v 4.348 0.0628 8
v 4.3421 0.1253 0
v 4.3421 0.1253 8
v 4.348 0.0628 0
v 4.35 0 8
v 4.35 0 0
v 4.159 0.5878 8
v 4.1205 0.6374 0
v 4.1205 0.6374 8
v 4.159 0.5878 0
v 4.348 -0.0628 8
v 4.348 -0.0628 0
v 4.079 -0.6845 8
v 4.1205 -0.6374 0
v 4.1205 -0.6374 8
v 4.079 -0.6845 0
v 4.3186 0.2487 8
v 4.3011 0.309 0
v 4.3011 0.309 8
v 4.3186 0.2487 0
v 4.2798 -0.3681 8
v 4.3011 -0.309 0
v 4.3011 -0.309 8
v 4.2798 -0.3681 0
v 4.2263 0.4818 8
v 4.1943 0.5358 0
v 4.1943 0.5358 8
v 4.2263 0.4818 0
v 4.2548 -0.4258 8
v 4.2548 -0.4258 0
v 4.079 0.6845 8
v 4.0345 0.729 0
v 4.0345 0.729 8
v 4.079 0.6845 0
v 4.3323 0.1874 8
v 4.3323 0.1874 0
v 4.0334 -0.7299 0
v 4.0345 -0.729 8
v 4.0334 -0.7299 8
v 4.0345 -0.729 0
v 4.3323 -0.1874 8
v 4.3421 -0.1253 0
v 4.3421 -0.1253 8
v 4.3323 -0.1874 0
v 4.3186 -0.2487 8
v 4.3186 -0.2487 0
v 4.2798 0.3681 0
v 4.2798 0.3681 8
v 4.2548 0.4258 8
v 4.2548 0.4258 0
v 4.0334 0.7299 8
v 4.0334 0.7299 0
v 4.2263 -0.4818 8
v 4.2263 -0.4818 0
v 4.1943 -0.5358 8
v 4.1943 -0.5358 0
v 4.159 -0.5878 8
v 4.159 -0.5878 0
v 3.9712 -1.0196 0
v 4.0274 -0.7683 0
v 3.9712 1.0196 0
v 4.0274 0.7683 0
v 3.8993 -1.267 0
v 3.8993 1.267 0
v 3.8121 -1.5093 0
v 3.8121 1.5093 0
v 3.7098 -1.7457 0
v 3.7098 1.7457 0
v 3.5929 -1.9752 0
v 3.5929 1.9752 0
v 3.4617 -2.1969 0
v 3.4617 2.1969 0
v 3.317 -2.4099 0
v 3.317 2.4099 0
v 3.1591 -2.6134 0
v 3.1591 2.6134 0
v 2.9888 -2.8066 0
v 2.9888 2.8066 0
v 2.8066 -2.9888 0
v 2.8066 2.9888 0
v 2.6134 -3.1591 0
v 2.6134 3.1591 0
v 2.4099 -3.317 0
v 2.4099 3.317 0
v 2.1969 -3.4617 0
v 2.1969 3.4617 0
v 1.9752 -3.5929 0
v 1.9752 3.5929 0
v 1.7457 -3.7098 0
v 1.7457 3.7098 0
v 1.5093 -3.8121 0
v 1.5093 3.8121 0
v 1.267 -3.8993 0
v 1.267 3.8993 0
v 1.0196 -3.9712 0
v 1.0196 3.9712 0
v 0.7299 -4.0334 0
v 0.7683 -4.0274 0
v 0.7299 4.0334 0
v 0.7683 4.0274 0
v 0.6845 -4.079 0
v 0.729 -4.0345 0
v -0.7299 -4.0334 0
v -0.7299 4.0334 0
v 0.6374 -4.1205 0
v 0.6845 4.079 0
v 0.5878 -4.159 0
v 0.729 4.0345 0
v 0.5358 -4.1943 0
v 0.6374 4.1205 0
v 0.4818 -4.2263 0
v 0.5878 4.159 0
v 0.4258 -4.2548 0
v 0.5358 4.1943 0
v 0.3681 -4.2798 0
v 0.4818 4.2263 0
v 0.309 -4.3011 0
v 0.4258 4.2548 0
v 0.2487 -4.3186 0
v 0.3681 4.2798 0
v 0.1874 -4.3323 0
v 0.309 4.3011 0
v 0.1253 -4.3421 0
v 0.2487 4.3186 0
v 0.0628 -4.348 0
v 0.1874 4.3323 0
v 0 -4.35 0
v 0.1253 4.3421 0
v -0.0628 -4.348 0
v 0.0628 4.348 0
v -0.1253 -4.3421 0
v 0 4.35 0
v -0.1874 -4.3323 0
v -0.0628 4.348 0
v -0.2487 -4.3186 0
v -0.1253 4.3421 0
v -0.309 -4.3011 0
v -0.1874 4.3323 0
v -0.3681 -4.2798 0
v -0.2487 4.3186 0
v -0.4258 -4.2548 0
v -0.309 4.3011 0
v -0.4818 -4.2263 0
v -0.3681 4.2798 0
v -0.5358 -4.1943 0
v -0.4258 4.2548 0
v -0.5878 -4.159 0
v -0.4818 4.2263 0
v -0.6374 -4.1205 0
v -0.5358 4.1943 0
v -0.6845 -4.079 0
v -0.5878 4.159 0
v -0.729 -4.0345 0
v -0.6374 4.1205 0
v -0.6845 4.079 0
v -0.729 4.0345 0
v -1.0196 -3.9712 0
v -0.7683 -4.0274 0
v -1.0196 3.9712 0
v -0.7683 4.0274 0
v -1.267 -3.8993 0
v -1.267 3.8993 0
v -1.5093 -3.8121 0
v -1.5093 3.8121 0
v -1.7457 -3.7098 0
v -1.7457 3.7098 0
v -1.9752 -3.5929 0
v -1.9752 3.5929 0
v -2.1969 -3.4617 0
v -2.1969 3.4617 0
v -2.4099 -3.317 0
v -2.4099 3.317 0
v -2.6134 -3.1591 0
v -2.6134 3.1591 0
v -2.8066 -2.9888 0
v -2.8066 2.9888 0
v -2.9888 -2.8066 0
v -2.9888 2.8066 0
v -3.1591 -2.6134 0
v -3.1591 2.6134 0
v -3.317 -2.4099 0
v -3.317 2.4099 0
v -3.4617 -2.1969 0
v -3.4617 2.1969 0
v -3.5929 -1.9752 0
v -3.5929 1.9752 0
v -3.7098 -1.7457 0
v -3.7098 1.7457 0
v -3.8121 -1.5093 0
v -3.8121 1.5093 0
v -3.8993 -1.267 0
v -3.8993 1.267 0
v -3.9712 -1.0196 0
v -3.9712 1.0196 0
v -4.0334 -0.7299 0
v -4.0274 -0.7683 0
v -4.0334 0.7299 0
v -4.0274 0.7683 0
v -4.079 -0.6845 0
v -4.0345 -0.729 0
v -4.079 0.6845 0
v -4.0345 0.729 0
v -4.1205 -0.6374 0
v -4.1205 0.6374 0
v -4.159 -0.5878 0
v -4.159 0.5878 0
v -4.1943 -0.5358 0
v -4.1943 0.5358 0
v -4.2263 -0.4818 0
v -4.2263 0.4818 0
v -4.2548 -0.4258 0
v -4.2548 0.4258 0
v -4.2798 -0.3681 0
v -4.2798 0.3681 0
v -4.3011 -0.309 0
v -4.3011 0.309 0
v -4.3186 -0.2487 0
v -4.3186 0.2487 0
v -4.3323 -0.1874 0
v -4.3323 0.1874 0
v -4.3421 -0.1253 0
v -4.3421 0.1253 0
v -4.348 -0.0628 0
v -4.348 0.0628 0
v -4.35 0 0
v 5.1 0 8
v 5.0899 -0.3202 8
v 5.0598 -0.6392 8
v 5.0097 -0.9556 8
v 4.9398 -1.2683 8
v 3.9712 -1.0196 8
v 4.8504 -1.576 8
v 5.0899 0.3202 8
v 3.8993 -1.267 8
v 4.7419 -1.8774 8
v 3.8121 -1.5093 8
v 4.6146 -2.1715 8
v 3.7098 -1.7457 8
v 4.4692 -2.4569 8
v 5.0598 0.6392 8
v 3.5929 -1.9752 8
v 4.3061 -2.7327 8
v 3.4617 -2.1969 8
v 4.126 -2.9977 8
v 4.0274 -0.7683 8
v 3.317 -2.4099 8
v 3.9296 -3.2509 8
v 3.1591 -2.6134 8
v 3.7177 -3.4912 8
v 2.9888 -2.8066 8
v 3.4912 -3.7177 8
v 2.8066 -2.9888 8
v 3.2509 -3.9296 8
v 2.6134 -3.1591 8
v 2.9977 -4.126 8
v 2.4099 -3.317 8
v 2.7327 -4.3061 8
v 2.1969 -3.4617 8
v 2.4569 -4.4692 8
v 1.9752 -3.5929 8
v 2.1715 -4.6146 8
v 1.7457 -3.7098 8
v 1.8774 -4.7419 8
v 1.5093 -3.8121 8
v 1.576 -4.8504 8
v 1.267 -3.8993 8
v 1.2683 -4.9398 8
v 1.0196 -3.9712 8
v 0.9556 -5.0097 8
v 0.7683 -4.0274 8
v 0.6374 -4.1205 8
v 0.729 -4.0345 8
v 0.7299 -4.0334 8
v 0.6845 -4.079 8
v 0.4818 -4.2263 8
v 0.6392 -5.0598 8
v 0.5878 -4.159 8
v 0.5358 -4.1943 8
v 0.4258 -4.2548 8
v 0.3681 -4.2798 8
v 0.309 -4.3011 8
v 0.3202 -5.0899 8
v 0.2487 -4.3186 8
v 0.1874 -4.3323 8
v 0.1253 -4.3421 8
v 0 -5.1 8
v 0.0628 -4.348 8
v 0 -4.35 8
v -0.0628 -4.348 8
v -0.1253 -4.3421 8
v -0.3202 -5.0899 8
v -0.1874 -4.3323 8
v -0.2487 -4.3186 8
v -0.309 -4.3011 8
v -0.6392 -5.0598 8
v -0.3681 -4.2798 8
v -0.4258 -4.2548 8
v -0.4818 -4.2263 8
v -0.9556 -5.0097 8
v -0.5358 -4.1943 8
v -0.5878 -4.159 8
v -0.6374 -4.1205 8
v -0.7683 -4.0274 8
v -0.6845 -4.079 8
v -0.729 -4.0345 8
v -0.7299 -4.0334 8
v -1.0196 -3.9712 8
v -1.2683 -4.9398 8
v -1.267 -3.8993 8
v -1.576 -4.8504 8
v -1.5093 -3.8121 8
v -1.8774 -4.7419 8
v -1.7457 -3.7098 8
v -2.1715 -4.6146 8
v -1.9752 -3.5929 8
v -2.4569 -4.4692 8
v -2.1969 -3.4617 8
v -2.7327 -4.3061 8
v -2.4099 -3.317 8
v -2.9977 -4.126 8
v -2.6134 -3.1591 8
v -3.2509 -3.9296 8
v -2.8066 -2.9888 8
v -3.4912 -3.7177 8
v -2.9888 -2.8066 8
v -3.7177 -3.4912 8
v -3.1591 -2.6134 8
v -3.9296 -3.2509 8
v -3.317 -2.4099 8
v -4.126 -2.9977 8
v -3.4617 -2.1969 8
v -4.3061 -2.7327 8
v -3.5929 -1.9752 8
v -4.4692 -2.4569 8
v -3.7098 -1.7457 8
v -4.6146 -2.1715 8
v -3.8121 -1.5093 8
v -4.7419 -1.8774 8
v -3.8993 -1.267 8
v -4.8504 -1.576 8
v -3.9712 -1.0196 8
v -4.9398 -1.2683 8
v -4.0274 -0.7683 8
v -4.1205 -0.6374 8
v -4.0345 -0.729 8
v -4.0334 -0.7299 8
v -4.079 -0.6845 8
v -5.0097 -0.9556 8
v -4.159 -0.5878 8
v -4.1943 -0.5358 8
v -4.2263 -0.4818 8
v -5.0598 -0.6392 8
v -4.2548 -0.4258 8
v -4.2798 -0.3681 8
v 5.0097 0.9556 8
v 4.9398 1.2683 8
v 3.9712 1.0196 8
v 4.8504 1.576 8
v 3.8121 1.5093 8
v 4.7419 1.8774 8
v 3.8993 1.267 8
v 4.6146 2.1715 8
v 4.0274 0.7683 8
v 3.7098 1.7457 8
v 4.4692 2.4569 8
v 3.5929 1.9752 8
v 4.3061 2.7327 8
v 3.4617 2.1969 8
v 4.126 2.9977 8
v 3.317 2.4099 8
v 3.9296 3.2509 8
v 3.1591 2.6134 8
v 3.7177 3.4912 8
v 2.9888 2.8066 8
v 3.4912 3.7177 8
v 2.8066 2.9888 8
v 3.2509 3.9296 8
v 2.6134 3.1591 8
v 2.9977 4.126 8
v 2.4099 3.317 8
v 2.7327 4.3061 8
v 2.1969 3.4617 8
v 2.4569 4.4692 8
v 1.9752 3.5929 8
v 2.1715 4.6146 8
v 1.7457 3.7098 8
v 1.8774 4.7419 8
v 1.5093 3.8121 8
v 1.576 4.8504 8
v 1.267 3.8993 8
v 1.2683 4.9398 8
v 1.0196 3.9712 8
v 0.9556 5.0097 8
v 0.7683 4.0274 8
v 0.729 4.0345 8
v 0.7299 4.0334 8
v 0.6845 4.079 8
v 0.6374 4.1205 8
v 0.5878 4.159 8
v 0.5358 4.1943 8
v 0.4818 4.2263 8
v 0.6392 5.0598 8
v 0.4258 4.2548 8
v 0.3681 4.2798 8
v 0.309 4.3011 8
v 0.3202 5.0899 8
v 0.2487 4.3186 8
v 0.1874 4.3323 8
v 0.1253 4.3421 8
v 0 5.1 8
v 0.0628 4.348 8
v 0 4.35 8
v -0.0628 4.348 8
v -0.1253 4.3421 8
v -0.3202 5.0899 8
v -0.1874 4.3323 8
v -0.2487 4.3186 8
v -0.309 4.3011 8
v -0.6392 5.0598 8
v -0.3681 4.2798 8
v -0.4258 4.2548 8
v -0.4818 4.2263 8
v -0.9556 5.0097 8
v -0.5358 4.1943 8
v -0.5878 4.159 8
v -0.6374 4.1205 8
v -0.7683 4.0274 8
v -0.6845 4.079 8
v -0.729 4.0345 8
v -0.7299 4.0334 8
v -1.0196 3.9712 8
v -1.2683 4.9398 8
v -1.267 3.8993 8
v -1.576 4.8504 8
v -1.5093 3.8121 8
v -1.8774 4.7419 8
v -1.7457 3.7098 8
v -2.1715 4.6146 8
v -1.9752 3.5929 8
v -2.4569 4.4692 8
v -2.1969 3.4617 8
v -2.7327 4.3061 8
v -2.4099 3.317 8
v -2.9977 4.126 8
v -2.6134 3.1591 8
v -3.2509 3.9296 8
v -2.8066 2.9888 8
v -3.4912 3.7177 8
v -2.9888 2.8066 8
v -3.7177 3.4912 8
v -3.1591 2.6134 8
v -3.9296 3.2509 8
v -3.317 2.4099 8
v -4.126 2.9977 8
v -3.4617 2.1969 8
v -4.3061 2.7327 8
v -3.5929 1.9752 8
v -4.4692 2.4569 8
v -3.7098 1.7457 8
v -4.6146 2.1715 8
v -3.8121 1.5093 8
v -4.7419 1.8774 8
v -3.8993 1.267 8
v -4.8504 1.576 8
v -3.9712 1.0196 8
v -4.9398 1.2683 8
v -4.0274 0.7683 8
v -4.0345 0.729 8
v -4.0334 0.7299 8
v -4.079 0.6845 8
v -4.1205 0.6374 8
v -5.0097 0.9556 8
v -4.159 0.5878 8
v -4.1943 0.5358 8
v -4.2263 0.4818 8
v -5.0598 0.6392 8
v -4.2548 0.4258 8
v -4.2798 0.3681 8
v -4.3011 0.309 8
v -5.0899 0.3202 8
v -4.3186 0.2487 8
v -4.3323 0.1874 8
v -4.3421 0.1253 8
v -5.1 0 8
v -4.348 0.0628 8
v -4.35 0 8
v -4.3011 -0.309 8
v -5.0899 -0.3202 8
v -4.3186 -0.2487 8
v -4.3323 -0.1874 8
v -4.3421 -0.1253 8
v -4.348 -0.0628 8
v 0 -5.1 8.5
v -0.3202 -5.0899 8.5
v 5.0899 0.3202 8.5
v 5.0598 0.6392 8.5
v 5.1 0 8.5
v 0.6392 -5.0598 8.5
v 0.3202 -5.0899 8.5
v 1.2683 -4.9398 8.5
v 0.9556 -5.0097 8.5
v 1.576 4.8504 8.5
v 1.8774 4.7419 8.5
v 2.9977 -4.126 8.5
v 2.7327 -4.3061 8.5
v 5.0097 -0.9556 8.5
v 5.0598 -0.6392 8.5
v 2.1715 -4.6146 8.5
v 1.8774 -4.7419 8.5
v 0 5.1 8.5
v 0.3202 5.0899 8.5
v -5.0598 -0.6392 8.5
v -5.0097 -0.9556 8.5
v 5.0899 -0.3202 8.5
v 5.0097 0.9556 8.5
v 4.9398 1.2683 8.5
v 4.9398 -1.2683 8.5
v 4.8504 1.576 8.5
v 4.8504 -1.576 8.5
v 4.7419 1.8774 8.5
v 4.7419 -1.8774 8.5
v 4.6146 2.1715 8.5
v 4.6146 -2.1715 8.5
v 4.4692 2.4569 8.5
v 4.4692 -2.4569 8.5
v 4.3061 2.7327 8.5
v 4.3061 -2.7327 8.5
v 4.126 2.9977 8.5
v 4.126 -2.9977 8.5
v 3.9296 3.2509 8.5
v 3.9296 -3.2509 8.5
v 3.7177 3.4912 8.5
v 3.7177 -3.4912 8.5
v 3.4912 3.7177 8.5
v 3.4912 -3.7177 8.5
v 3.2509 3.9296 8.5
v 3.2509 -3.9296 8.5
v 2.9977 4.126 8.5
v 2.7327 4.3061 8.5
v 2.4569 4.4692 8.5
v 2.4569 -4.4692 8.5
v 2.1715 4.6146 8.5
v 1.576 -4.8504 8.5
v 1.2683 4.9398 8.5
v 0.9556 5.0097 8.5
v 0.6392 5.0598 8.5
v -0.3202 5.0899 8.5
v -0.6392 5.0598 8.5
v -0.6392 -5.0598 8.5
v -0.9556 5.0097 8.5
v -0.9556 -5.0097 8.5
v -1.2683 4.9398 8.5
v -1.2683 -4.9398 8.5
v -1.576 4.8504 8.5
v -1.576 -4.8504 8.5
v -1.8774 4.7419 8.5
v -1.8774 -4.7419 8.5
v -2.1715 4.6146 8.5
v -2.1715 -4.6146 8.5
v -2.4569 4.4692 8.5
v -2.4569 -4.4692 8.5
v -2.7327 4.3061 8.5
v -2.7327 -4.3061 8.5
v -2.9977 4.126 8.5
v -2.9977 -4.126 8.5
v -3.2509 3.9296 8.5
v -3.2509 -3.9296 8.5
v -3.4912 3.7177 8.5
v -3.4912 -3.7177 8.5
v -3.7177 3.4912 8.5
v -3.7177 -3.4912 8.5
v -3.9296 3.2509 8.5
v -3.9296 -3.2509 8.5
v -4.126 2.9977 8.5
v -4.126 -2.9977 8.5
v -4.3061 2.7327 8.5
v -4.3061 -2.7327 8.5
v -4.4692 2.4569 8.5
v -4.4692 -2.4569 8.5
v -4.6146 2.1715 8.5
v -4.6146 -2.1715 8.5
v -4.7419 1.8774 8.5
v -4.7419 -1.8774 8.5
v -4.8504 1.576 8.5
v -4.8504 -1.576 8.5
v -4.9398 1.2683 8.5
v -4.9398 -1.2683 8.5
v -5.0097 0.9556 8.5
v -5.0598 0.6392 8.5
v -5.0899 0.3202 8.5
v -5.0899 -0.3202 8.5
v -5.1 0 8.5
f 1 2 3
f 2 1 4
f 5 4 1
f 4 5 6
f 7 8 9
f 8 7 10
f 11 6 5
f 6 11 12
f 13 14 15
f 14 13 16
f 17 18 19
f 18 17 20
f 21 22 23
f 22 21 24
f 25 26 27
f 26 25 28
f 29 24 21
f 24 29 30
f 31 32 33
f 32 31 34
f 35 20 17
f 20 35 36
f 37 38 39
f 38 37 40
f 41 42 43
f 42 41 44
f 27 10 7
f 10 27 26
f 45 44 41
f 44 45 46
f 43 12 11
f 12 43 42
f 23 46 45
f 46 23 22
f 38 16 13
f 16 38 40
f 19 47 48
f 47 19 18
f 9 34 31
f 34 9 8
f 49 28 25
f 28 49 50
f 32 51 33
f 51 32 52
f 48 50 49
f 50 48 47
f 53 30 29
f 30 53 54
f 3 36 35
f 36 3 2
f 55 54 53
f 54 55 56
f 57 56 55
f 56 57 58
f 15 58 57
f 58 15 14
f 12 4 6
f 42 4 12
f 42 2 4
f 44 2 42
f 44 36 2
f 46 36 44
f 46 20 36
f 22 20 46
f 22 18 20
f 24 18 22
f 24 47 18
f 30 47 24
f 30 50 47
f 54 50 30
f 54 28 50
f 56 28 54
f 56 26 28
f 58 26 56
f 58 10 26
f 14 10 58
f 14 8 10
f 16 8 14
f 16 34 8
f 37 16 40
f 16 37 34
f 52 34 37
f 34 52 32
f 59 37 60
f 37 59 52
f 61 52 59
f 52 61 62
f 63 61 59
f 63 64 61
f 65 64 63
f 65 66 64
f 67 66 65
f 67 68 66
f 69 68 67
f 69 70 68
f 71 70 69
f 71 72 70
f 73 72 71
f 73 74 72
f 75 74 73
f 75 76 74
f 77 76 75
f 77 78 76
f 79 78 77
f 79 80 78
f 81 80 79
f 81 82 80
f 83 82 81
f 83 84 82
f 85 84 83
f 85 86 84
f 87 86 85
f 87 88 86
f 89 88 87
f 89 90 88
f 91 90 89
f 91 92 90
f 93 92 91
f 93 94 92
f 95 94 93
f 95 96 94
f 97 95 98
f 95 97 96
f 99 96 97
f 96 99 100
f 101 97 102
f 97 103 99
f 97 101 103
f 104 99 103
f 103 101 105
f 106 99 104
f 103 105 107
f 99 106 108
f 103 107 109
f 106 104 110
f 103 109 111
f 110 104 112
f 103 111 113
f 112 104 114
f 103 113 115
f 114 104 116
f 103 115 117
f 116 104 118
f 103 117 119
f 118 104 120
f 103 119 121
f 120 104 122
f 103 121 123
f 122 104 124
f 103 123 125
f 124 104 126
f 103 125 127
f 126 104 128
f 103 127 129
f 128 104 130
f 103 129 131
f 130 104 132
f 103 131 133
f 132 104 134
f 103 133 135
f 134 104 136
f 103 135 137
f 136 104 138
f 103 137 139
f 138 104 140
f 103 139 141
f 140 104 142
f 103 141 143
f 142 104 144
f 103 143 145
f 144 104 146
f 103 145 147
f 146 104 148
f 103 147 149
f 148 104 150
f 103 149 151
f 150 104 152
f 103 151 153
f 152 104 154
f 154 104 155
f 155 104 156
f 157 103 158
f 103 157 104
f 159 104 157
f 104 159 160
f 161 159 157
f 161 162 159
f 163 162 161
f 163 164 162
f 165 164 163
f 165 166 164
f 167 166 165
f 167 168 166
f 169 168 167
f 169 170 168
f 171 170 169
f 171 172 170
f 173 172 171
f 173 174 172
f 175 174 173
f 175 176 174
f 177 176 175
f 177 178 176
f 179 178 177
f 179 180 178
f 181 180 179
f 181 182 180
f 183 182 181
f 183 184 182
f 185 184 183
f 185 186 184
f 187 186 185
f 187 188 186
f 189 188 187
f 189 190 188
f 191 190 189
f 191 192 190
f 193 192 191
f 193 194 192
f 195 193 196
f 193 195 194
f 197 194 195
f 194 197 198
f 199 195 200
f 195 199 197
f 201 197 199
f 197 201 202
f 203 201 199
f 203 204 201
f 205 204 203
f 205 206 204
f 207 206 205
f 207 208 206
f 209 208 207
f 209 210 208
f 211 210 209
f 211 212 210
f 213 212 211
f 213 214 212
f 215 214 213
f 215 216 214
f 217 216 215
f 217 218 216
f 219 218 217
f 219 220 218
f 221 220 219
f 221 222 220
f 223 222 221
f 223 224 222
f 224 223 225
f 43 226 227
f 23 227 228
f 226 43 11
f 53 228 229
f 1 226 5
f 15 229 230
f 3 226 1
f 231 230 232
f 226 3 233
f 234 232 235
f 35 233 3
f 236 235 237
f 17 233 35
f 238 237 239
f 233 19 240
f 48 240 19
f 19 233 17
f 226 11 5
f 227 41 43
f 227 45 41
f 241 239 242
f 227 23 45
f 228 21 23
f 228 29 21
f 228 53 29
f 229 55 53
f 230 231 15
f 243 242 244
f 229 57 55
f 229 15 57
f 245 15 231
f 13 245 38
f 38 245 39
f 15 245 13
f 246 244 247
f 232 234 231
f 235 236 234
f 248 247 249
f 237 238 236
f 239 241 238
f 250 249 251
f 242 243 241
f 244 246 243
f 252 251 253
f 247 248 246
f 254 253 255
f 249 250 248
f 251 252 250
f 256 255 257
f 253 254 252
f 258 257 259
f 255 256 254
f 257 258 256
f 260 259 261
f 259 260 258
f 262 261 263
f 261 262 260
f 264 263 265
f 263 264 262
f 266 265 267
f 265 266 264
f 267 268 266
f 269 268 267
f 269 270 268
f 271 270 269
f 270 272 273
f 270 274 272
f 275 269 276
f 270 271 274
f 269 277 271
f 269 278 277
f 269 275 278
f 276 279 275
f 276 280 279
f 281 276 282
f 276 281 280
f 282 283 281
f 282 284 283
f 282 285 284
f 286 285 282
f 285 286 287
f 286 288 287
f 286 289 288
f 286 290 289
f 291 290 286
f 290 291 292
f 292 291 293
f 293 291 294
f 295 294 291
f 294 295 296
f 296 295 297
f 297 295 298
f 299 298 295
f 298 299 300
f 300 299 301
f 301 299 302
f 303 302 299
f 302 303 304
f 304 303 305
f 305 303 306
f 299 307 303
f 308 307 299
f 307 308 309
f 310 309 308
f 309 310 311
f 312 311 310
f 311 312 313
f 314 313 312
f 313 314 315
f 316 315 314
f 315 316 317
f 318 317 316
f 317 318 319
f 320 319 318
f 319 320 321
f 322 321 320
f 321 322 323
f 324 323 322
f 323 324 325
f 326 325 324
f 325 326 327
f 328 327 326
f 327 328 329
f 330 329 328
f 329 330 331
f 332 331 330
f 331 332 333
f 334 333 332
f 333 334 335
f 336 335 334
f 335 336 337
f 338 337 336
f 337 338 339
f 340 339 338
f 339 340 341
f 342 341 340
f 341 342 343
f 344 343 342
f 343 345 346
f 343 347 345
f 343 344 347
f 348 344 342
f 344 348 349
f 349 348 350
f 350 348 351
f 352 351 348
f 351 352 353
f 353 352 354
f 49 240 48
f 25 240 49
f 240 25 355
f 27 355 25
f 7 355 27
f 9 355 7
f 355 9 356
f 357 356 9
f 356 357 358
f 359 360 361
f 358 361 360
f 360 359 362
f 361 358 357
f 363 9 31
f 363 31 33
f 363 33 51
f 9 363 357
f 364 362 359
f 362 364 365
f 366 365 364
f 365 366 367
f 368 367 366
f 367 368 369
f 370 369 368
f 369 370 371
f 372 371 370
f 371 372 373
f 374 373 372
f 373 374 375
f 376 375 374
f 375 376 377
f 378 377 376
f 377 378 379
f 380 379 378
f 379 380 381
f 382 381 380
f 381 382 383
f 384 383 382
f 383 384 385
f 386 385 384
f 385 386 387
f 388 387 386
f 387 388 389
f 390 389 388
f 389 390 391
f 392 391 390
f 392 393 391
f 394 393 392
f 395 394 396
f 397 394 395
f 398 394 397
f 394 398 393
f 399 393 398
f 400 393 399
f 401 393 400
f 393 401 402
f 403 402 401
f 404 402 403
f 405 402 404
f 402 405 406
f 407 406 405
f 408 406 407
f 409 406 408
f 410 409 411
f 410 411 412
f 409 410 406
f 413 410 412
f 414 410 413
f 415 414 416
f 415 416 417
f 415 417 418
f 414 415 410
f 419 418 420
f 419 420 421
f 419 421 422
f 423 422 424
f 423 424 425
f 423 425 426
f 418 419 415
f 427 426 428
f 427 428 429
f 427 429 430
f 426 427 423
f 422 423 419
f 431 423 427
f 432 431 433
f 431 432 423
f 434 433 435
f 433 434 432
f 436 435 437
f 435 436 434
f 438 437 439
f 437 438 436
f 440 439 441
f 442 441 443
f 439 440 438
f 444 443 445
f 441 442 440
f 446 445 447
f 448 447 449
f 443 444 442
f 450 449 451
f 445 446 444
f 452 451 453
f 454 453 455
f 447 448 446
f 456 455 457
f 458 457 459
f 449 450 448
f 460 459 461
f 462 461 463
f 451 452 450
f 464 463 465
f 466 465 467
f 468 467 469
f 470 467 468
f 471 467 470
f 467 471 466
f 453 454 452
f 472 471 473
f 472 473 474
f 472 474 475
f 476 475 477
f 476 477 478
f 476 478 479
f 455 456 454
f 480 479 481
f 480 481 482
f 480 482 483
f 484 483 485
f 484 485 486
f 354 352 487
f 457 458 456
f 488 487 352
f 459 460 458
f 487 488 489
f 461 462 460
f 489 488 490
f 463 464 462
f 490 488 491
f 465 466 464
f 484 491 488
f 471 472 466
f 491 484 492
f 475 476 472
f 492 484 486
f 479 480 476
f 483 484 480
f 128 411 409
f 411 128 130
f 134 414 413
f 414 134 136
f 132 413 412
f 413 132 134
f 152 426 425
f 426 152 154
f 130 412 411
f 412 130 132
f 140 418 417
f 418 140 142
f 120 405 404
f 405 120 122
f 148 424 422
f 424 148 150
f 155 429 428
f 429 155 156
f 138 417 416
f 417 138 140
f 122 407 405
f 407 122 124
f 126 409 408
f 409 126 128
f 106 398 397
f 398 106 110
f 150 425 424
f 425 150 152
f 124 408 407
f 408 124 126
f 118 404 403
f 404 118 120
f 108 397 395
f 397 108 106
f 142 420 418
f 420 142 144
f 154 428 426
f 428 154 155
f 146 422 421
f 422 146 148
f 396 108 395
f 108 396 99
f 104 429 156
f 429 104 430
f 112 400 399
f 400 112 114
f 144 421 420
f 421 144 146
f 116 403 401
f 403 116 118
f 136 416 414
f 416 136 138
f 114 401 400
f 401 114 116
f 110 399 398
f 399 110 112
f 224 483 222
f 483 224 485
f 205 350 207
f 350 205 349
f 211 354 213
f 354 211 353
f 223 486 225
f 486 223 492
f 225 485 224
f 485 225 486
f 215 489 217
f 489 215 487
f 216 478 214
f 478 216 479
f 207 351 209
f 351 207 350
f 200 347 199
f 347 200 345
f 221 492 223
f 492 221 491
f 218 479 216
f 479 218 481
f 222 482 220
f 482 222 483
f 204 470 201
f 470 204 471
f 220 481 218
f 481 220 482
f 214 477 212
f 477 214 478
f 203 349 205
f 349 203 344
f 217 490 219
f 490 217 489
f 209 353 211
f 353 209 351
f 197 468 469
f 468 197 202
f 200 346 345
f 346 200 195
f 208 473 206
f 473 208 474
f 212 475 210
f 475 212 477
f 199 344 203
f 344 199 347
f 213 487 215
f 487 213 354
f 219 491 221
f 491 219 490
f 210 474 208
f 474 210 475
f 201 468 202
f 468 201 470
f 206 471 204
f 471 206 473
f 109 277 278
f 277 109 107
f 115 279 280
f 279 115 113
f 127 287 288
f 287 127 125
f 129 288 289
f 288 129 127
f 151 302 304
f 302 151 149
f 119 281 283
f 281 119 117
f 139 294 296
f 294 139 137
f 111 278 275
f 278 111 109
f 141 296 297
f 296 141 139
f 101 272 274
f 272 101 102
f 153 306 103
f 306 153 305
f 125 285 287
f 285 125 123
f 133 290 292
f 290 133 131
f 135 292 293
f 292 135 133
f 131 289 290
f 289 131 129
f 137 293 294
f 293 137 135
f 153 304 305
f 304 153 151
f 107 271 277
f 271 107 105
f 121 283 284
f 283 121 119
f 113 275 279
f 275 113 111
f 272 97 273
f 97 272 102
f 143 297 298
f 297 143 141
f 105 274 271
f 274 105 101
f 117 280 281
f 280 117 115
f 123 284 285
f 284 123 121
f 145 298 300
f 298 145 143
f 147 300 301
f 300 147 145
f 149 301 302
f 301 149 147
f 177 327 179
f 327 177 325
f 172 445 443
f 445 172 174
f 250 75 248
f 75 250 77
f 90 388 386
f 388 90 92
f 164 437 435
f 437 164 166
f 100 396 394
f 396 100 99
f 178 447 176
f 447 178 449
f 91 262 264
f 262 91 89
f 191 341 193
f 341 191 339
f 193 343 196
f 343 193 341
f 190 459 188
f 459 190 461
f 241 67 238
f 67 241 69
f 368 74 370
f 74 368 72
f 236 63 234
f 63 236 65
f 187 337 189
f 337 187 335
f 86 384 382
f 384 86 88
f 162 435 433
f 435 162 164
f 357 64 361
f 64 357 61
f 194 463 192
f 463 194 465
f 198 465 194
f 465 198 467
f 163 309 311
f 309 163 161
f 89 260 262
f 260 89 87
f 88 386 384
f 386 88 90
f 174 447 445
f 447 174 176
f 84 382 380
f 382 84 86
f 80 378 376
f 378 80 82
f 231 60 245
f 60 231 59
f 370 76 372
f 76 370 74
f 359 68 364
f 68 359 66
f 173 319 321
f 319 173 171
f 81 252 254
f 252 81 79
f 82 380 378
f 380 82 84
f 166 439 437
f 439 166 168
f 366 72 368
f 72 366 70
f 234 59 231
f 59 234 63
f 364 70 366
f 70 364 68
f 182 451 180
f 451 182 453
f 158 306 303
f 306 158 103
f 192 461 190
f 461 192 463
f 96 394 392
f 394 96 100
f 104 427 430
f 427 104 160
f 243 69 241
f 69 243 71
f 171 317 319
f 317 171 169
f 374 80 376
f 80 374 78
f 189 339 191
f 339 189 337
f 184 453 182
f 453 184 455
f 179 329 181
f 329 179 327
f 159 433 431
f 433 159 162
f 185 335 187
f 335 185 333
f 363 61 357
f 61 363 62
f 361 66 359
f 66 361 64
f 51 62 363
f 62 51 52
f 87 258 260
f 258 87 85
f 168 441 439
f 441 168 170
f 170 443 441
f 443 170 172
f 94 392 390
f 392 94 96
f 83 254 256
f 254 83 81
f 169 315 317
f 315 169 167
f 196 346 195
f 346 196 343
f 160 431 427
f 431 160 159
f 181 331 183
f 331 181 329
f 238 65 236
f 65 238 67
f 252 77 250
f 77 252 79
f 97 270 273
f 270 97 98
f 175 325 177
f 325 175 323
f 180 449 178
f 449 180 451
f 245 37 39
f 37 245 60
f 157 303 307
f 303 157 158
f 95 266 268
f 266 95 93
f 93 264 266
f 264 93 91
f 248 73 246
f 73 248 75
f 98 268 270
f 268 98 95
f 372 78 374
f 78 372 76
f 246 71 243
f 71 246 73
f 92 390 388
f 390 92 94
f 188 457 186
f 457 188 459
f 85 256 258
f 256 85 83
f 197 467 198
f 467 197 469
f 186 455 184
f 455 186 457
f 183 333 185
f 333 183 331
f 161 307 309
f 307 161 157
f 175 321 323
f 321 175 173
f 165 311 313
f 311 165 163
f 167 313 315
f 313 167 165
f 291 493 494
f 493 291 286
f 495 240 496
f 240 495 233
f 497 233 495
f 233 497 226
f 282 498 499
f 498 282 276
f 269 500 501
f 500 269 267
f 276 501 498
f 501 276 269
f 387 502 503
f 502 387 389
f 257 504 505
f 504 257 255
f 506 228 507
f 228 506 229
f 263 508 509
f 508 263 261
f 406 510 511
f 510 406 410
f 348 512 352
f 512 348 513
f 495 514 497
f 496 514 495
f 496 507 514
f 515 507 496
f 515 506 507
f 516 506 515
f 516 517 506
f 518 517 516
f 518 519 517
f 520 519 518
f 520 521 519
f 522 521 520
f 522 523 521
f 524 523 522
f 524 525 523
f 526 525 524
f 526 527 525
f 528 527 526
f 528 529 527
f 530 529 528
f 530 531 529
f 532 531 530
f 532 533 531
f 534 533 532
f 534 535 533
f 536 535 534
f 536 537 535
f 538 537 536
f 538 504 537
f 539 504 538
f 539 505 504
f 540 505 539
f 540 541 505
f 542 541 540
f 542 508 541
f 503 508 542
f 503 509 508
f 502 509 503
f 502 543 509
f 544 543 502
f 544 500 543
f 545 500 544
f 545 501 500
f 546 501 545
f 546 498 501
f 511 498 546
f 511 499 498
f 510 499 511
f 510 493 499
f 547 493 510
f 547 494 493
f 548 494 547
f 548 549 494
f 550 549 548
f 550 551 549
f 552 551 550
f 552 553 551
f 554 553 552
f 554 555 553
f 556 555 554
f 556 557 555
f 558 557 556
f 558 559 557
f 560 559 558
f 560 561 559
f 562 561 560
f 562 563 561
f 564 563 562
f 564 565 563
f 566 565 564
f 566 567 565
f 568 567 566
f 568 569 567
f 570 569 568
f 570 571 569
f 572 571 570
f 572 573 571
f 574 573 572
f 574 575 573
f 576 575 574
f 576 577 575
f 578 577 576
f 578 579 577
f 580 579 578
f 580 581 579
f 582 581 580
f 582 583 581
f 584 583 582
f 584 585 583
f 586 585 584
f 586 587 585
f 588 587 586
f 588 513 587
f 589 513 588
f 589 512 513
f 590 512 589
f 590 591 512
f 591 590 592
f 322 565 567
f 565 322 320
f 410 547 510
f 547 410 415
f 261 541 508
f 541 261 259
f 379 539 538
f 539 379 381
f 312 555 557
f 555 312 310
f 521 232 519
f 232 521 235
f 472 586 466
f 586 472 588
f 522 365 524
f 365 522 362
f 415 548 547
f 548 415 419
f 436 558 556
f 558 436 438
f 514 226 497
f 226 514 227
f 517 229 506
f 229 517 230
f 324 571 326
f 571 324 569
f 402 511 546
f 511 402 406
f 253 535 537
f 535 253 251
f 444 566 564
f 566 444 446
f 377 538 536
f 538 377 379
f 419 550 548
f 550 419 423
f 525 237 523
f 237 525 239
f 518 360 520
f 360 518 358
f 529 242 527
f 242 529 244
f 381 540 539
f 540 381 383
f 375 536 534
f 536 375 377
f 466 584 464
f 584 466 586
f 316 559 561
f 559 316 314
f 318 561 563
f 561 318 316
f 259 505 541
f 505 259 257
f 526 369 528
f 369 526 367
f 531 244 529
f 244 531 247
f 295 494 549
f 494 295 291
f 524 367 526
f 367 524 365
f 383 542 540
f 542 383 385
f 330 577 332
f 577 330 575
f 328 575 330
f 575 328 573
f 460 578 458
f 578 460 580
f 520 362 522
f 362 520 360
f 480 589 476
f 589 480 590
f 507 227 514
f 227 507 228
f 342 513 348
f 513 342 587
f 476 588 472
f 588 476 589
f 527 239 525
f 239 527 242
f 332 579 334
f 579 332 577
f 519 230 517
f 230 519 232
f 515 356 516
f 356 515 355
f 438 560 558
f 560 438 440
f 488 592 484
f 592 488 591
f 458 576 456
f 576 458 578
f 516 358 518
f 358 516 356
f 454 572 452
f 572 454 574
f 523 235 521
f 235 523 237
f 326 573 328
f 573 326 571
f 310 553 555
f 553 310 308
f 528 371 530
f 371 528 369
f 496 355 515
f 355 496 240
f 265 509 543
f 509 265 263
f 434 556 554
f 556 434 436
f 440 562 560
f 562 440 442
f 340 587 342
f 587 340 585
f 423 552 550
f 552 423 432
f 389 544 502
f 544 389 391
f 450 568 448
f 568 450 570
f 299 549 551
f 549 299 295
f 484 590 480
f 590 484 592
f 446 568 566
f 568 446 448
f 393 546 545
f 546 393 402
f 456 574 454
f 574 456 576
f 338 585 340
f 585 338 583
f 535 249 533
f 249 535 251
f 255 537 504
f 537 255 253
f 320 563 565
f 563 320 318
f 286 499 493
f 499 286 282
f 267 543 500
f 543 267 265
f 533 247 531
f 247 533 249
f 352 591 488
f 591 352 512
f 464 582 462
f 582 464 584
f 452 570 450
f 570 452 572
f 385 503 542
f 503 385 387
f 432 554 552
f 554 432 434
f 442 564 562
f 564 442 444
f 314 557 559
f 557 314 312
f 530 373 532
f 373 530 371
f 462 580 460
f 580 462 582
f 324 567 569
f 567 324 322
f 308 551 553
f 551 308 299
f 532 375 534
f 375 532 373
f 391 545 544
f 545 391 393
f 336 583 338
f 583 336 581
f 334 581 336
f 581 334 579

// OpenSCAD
$fn = 100;
height = 8;
radius = 8.2 / 2;

cylinder(r=radius, h=height);
for (i = [0 : 90 : 360]) {
  rotate(i) {
    translate([radius - 0.75, 0, 0]) {
      cylinder(r=1, h=height);
    }
  }
}
translate([0, 0, height])
  cylinder(r=radius + 1, h=0.5);
